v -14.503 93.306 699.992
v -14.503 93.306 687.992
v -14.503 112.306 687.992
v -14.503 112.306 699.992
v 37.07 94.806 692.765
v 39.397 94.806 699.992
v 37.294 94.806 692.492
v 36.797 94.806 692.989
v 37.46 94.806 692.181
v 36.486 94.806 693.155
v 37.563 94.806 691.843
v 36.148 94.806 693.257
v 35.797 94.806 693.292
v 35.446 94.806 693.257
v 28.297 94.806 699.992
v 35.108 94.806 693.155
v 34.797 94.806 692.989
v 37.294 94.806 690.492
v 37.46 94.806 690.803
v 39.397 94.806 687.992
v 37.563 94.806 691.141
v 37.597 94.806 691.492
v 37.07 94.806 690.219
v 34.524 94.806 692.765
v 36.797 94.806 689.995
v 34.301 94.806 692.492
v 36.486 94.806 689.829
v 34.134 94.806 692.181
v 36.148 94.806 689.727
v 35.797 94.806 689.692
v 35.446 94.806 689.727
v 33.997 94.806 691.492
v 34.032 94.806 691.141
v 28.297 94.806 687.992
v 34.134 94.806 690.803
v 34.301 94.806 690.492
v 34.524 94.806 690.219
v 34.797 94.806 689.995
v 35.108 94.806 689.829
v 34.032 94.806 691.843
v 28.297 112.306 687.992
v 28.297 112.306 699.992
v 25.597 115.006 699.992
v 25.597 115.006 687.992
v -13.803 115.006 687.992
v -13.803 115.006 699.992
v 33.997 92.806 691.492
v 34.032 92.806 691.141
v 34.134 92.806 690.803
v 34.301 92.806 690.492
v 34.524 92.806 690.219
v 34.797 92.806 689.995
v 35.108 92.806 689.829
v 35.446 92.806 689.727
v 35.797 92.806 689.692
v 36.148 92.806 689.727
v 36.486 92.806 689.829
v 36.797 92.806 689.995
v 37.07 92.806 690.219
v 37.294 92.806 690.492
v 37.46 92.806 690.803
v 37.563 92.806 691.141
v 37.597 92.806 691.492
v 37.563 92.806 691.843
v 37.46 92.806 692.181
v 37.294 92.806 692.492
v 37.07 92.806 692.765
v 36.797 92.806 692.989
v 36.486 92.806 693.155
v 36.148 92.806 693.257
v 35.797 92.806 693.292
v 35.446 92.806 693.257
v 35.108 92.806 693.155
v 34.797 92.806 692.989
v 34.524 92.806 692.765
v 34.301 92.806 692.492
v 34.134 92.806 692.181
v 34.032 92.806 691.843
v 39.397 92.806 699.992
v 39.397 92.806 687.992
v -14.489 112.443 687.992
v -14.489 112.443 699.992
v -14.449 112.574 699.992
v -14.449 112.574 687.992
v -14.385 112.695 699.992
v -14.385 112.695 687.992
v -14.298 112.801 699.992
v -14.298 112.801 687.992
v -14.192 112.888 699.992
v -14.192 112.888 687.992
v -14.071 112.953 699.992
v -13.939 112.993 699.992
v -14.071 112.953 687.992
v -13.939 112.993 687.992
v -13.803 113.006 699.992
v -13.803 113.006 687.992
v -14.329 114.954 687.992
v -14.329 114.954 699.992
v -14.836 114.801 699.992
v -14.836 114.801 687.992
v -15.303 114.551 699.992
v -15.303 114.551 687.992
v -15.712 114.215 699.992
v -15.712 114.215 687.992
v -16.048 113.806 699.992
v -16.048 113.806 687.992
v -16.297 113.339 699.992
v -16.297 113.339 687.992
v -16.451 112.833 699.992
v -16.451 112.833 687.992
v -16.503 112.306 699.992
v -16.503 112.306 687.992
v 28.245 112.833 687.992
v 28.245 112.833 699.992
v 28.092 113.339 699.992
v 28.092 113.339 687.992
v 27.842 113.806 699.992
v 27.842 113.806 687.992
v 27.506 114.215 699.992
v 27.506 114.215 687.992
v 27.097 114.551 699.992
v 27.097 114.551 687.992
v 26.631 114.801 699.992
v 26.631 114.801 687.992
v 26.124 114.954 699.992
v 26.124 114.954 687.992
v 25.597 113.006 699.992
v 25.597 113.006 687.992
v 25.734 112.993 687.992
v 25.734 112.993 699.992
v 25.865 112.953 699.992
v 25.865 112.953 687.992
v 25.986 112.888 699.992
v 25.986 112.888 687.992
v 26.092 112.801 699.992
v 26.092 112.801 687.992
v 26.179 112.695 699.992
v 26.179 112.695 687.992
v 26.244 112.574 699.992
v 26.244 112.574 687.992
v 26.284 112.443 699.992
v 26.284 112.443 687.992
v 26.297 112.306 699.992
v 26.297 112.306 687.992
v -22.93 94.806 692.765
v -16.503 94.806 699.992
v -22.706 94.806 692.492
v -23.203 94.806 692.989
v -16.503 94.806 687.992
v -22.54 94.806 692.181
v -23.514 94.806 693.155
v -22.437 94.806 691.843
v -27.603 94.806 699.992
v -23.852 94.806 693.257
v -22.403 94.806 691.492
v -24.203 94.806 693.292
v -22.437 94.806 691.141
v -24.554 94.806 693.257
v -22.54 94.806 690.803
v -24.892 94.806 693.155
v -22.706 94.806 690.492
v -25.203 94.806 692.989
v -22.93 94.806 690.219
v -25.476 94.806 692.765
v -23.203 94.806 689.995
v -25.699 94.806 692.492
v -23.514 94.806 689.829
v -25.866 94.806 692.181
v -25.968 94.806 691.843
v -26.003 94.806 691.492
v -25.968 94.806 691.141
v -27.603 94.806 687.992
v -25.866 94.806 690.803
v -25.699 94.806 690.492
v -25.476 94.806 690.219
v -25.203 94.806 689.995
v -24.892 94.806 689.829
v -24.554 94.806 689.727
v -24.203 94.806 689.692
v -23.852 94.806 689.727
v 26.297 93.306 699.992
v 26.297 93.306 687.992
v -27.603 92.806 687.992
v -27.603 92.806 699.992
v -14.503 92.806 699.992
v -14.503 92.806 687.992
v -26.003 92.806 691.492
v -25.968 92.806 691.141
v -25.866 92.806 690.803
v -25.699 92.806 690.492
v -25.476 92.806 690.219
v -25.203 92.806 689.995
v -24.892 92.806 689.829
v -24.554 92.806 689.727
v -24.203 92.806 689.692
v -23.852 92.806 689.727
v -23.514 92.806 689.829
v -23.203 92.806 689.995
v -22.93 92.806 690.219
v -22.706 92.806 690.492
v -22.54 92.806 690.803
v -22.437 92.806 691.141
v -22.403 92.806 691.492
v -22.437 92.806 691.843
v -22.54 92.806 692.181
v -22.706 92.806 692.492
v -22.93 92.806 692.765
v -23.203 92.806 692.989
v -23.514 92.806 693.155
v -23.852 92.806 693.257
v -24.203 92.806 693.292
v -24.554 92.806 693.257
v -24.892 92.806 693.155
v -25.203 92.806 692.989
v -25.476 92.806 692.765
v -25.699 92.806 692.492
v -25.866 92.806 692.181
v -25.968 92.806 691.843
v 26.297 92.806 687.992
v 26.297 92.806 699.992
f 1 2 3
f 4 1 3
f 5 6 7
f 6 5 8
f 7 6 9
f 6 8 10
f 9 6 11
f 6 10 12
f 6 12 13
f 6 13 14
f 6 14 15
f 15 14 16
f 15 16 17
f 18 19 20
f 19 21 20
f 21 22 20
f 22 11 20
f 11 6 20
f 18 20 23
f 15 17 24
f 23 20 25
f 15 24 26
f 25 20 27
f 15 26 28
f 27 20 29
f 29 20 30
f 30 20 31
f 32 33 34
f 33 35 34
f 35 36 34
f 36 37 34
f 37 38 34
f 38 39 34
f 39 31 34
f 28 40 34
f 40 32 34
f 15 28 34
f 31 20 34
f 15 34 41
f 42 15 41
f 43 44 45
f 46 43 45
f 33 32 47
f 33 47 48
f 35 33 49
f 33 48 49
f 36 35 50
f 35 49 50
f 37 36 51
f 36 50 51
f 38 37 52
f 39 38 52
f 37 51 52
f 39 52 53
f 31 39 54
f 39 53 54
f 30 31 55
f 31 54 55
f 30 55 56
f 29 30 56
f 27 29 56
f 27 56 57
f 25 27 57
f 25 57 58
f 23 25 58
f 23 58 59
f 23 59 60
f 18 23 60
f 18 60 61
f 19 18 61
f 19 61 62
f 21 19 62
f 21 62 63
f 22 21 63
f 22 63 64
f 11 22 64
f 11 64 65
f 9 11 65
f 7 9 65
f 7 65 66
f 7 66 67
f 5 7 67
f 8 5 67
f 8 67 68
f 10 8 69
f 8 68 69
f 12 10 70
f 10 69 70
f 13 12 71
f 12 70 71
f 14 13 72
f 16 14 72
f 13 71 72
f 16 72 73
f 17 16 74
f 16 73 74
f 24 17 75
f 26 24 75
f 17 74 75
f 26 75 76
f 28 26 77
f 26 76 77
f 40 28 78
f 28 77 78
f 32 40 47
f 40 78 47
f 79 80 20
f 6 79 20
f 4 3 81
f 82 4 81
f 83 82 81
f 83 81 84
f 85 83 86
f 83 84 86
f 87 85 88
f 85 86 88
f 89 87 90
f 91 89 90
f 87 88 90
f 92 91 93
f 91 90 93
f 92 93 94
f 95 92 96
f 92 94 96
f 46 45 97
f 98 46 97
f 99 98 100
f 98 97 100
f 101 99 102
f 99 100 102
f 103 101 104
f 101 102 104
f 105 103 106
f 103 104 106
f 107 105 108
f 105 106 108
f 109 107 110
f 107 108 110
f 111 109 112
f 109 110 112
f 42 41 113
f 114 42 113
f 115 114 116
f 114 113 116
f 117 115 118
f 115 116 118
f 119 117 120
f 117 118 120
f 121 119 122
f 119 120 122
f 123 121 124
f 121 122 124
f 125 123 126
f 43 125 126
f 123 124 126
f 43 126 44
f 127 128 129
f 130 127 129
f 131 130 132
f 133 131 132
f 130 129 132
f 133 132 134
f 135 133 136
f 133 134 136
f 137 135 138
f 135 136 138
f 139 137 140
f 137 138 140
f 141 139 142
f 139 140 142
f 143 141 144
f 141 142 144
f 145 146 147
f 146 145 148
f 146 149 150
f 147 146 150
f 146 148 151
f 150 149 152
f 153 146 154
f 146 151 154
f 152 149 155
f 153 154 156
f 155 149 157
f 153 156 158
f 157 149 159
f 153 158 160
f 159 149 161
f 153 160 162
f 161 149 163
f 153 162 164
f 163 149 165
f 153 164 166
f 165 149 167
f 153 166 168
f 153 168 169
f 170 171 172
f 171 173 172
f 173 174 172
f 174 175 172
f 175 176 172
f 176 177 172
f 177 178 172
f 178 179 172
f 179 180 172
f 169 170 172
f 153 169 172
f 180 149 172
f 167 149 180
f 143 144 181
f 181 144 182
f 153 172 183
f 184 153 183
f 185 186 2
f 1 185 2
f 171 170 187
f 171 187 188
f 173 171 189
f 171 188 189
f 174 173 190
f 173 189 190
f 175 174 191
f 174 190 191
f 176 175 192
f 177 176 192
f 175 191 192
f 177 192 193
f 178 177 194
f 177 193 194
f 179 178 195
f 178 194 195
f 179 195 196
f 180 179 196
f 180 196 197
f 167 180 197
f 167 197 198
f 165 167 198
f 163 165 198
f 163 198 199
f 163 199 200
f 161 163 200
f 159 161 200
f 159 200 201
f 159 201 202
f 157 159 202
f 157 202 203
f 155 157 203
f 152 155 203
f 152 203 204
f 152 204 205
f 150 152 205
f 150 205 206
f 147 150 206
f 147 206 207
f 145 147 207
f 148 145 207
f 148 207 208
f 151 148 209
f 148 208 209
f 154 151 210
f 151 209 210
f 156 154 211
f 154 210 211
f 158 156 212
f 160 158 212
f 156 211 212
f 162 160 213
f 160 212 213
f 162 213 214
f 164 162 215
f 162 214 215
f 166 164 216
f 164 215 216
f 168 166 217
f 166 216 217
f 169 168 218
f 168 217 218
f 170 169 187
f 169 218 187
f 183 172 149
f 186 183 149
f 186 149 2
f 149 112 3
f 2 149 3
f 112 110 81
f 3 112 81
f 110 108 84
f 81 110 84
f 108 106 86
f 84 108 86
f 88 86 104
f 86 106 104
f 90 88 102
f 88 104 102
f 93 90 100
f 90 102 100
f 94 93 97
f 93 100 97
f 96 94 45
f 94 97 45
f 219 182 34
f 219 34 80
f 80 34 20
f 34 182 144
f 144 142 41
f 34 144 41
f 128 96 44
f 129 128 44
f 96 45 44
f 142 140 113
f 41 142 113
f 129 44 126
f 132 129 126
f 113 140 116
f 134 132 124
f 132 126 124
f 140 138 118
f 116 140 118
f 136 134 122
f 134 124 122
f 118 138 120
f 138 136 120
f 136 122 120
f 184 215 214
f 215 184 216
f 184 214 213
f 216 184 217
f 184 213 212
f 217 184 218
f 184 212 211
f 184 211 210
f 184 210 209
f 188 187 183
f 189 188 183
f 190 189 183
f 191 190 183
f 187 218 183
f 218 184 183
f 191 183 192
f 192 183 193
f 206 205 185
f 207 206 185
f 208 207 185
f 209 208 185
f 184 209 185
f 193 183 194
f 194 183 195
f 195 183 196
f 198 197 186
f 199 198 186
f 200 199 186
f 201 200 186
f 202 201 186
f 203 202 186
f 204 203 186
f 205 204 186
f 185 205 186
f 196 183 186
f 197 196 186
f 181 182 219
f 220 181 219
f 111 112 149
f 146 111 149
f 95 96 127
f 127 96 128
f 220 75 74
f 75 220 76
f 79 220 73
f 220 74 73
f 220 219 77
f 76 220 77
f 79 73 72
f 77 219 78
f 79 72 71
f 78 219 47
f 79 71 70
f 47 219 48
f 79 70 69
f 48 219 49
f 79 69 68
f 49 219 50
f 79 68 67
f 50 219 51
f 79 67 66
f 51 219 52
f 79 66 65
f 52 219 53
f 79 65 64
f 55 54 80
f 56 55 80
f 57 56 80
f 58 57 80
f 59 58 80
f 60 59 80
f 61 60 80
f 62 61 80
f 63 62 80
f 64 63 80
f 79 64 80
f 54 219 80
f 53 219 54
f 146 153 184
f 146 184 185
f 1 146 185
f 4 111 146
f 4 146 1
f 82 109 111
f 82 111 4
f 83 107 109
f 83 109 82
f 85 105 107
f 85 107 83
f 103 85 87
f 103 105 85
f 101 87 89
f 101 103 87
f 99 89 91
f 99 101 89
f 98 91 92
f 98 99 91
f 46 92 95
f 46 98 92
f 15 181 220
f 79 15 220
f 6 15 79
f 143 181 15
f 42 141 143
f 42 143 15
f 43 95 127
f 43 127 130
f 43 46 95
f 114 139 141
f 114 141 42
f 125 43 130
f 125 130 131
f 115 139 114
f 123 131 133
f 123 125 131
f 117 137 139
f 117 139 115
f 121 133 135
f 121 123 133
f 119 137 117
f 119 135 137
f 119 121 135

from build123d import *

# Parameters (mm, degrees)
BOSS_EXTRUDE1_DEPTH  = 12
M3_CLEARANCE_HOLE1_D = 3.6


with BuildPart() as part:
    # Sketch2 → Boss-Extrude1 (new body)
    with BuildSketch(Plane(origin=(-74.202720672, 5.306098308, 687.991999443), x_dir=(0.9999999999999999, 0, -2.239969215025861e-08), z_dir=(2.239969215025861e-08, 0, 0.9999999999999999))):
        with BuildLine():
            Line((59.700000081, 87.500000033), (59.700000081, 88.000000033))
            Line((59.700000081, 88.000000033), (59.700000142, 107.000000033))
            ThreePointArc((59.700000142, 107.000000033), (59.905025396, 107.494974779), (60.400000144, 107.70000003))
            Line((60.400000144, 107.70000003), (99.800000144, 107.699999904))
            ThreePointArc((99.800000144, 107.699999904), (100.29497489, 107.49497465), (100.500000142, 106.999999902))
            Line((100.500000142, 106.999999902), (100.500000081, 87.999999902))
            Line((100.500000081, 87.999999902), (100.500000081, 87.499999902))
            Line((100.500000081, 87.499999902), (113.600000142, 87.49999986))
            Line((113.600000142, 87.49999986), (113.600000142, 89.49999986))
            Line((113.600000142, 89.49999986), (102.500000086, 89.49999986))
            Line((102.500000086, 89.49999986), (102.500000142, 106.999999896))
            ThreePointArc((102.500000142, 106.999999896), (101.709188457, 108.909188207), (99.80000015, 109.699999904))
            Line((99.80000015, 109.699999904), (60.40000015, 109.70000003))
            ThreePointArc((60.40000015, 109.70000003), (58.490811839, 108.909188346), (57.700000142, 107.000000039))
            Line((57.700000142, 107.000000039), (57.700000142, 89.500000075))
            Line((57.700000142, 89.500000075), (46.600000142, 89.500000075))
            Line((46.600000142, 89.500000075), (46.600000142, 87.500000075))
            Line((46.600000142, 87.500000075), (59.700000081, 87.500000033))
        make_face()
    extrude(amount=BOSS_EXTRUDE1_DEPTH)

    # M3 Clearance Hole1 (through all)
    with Locations(Plane(origin=(0, 94.806098383, 0), x_dir=(1, 0, 0), z_dir=(0, 1, 0))):
        with Locations((-24.202720482, -691.491998323), (35.797279518, -691.491996979)):
            Hole(M3_CLEARANCE_HOLE1_D / 2)


solid = part.part
